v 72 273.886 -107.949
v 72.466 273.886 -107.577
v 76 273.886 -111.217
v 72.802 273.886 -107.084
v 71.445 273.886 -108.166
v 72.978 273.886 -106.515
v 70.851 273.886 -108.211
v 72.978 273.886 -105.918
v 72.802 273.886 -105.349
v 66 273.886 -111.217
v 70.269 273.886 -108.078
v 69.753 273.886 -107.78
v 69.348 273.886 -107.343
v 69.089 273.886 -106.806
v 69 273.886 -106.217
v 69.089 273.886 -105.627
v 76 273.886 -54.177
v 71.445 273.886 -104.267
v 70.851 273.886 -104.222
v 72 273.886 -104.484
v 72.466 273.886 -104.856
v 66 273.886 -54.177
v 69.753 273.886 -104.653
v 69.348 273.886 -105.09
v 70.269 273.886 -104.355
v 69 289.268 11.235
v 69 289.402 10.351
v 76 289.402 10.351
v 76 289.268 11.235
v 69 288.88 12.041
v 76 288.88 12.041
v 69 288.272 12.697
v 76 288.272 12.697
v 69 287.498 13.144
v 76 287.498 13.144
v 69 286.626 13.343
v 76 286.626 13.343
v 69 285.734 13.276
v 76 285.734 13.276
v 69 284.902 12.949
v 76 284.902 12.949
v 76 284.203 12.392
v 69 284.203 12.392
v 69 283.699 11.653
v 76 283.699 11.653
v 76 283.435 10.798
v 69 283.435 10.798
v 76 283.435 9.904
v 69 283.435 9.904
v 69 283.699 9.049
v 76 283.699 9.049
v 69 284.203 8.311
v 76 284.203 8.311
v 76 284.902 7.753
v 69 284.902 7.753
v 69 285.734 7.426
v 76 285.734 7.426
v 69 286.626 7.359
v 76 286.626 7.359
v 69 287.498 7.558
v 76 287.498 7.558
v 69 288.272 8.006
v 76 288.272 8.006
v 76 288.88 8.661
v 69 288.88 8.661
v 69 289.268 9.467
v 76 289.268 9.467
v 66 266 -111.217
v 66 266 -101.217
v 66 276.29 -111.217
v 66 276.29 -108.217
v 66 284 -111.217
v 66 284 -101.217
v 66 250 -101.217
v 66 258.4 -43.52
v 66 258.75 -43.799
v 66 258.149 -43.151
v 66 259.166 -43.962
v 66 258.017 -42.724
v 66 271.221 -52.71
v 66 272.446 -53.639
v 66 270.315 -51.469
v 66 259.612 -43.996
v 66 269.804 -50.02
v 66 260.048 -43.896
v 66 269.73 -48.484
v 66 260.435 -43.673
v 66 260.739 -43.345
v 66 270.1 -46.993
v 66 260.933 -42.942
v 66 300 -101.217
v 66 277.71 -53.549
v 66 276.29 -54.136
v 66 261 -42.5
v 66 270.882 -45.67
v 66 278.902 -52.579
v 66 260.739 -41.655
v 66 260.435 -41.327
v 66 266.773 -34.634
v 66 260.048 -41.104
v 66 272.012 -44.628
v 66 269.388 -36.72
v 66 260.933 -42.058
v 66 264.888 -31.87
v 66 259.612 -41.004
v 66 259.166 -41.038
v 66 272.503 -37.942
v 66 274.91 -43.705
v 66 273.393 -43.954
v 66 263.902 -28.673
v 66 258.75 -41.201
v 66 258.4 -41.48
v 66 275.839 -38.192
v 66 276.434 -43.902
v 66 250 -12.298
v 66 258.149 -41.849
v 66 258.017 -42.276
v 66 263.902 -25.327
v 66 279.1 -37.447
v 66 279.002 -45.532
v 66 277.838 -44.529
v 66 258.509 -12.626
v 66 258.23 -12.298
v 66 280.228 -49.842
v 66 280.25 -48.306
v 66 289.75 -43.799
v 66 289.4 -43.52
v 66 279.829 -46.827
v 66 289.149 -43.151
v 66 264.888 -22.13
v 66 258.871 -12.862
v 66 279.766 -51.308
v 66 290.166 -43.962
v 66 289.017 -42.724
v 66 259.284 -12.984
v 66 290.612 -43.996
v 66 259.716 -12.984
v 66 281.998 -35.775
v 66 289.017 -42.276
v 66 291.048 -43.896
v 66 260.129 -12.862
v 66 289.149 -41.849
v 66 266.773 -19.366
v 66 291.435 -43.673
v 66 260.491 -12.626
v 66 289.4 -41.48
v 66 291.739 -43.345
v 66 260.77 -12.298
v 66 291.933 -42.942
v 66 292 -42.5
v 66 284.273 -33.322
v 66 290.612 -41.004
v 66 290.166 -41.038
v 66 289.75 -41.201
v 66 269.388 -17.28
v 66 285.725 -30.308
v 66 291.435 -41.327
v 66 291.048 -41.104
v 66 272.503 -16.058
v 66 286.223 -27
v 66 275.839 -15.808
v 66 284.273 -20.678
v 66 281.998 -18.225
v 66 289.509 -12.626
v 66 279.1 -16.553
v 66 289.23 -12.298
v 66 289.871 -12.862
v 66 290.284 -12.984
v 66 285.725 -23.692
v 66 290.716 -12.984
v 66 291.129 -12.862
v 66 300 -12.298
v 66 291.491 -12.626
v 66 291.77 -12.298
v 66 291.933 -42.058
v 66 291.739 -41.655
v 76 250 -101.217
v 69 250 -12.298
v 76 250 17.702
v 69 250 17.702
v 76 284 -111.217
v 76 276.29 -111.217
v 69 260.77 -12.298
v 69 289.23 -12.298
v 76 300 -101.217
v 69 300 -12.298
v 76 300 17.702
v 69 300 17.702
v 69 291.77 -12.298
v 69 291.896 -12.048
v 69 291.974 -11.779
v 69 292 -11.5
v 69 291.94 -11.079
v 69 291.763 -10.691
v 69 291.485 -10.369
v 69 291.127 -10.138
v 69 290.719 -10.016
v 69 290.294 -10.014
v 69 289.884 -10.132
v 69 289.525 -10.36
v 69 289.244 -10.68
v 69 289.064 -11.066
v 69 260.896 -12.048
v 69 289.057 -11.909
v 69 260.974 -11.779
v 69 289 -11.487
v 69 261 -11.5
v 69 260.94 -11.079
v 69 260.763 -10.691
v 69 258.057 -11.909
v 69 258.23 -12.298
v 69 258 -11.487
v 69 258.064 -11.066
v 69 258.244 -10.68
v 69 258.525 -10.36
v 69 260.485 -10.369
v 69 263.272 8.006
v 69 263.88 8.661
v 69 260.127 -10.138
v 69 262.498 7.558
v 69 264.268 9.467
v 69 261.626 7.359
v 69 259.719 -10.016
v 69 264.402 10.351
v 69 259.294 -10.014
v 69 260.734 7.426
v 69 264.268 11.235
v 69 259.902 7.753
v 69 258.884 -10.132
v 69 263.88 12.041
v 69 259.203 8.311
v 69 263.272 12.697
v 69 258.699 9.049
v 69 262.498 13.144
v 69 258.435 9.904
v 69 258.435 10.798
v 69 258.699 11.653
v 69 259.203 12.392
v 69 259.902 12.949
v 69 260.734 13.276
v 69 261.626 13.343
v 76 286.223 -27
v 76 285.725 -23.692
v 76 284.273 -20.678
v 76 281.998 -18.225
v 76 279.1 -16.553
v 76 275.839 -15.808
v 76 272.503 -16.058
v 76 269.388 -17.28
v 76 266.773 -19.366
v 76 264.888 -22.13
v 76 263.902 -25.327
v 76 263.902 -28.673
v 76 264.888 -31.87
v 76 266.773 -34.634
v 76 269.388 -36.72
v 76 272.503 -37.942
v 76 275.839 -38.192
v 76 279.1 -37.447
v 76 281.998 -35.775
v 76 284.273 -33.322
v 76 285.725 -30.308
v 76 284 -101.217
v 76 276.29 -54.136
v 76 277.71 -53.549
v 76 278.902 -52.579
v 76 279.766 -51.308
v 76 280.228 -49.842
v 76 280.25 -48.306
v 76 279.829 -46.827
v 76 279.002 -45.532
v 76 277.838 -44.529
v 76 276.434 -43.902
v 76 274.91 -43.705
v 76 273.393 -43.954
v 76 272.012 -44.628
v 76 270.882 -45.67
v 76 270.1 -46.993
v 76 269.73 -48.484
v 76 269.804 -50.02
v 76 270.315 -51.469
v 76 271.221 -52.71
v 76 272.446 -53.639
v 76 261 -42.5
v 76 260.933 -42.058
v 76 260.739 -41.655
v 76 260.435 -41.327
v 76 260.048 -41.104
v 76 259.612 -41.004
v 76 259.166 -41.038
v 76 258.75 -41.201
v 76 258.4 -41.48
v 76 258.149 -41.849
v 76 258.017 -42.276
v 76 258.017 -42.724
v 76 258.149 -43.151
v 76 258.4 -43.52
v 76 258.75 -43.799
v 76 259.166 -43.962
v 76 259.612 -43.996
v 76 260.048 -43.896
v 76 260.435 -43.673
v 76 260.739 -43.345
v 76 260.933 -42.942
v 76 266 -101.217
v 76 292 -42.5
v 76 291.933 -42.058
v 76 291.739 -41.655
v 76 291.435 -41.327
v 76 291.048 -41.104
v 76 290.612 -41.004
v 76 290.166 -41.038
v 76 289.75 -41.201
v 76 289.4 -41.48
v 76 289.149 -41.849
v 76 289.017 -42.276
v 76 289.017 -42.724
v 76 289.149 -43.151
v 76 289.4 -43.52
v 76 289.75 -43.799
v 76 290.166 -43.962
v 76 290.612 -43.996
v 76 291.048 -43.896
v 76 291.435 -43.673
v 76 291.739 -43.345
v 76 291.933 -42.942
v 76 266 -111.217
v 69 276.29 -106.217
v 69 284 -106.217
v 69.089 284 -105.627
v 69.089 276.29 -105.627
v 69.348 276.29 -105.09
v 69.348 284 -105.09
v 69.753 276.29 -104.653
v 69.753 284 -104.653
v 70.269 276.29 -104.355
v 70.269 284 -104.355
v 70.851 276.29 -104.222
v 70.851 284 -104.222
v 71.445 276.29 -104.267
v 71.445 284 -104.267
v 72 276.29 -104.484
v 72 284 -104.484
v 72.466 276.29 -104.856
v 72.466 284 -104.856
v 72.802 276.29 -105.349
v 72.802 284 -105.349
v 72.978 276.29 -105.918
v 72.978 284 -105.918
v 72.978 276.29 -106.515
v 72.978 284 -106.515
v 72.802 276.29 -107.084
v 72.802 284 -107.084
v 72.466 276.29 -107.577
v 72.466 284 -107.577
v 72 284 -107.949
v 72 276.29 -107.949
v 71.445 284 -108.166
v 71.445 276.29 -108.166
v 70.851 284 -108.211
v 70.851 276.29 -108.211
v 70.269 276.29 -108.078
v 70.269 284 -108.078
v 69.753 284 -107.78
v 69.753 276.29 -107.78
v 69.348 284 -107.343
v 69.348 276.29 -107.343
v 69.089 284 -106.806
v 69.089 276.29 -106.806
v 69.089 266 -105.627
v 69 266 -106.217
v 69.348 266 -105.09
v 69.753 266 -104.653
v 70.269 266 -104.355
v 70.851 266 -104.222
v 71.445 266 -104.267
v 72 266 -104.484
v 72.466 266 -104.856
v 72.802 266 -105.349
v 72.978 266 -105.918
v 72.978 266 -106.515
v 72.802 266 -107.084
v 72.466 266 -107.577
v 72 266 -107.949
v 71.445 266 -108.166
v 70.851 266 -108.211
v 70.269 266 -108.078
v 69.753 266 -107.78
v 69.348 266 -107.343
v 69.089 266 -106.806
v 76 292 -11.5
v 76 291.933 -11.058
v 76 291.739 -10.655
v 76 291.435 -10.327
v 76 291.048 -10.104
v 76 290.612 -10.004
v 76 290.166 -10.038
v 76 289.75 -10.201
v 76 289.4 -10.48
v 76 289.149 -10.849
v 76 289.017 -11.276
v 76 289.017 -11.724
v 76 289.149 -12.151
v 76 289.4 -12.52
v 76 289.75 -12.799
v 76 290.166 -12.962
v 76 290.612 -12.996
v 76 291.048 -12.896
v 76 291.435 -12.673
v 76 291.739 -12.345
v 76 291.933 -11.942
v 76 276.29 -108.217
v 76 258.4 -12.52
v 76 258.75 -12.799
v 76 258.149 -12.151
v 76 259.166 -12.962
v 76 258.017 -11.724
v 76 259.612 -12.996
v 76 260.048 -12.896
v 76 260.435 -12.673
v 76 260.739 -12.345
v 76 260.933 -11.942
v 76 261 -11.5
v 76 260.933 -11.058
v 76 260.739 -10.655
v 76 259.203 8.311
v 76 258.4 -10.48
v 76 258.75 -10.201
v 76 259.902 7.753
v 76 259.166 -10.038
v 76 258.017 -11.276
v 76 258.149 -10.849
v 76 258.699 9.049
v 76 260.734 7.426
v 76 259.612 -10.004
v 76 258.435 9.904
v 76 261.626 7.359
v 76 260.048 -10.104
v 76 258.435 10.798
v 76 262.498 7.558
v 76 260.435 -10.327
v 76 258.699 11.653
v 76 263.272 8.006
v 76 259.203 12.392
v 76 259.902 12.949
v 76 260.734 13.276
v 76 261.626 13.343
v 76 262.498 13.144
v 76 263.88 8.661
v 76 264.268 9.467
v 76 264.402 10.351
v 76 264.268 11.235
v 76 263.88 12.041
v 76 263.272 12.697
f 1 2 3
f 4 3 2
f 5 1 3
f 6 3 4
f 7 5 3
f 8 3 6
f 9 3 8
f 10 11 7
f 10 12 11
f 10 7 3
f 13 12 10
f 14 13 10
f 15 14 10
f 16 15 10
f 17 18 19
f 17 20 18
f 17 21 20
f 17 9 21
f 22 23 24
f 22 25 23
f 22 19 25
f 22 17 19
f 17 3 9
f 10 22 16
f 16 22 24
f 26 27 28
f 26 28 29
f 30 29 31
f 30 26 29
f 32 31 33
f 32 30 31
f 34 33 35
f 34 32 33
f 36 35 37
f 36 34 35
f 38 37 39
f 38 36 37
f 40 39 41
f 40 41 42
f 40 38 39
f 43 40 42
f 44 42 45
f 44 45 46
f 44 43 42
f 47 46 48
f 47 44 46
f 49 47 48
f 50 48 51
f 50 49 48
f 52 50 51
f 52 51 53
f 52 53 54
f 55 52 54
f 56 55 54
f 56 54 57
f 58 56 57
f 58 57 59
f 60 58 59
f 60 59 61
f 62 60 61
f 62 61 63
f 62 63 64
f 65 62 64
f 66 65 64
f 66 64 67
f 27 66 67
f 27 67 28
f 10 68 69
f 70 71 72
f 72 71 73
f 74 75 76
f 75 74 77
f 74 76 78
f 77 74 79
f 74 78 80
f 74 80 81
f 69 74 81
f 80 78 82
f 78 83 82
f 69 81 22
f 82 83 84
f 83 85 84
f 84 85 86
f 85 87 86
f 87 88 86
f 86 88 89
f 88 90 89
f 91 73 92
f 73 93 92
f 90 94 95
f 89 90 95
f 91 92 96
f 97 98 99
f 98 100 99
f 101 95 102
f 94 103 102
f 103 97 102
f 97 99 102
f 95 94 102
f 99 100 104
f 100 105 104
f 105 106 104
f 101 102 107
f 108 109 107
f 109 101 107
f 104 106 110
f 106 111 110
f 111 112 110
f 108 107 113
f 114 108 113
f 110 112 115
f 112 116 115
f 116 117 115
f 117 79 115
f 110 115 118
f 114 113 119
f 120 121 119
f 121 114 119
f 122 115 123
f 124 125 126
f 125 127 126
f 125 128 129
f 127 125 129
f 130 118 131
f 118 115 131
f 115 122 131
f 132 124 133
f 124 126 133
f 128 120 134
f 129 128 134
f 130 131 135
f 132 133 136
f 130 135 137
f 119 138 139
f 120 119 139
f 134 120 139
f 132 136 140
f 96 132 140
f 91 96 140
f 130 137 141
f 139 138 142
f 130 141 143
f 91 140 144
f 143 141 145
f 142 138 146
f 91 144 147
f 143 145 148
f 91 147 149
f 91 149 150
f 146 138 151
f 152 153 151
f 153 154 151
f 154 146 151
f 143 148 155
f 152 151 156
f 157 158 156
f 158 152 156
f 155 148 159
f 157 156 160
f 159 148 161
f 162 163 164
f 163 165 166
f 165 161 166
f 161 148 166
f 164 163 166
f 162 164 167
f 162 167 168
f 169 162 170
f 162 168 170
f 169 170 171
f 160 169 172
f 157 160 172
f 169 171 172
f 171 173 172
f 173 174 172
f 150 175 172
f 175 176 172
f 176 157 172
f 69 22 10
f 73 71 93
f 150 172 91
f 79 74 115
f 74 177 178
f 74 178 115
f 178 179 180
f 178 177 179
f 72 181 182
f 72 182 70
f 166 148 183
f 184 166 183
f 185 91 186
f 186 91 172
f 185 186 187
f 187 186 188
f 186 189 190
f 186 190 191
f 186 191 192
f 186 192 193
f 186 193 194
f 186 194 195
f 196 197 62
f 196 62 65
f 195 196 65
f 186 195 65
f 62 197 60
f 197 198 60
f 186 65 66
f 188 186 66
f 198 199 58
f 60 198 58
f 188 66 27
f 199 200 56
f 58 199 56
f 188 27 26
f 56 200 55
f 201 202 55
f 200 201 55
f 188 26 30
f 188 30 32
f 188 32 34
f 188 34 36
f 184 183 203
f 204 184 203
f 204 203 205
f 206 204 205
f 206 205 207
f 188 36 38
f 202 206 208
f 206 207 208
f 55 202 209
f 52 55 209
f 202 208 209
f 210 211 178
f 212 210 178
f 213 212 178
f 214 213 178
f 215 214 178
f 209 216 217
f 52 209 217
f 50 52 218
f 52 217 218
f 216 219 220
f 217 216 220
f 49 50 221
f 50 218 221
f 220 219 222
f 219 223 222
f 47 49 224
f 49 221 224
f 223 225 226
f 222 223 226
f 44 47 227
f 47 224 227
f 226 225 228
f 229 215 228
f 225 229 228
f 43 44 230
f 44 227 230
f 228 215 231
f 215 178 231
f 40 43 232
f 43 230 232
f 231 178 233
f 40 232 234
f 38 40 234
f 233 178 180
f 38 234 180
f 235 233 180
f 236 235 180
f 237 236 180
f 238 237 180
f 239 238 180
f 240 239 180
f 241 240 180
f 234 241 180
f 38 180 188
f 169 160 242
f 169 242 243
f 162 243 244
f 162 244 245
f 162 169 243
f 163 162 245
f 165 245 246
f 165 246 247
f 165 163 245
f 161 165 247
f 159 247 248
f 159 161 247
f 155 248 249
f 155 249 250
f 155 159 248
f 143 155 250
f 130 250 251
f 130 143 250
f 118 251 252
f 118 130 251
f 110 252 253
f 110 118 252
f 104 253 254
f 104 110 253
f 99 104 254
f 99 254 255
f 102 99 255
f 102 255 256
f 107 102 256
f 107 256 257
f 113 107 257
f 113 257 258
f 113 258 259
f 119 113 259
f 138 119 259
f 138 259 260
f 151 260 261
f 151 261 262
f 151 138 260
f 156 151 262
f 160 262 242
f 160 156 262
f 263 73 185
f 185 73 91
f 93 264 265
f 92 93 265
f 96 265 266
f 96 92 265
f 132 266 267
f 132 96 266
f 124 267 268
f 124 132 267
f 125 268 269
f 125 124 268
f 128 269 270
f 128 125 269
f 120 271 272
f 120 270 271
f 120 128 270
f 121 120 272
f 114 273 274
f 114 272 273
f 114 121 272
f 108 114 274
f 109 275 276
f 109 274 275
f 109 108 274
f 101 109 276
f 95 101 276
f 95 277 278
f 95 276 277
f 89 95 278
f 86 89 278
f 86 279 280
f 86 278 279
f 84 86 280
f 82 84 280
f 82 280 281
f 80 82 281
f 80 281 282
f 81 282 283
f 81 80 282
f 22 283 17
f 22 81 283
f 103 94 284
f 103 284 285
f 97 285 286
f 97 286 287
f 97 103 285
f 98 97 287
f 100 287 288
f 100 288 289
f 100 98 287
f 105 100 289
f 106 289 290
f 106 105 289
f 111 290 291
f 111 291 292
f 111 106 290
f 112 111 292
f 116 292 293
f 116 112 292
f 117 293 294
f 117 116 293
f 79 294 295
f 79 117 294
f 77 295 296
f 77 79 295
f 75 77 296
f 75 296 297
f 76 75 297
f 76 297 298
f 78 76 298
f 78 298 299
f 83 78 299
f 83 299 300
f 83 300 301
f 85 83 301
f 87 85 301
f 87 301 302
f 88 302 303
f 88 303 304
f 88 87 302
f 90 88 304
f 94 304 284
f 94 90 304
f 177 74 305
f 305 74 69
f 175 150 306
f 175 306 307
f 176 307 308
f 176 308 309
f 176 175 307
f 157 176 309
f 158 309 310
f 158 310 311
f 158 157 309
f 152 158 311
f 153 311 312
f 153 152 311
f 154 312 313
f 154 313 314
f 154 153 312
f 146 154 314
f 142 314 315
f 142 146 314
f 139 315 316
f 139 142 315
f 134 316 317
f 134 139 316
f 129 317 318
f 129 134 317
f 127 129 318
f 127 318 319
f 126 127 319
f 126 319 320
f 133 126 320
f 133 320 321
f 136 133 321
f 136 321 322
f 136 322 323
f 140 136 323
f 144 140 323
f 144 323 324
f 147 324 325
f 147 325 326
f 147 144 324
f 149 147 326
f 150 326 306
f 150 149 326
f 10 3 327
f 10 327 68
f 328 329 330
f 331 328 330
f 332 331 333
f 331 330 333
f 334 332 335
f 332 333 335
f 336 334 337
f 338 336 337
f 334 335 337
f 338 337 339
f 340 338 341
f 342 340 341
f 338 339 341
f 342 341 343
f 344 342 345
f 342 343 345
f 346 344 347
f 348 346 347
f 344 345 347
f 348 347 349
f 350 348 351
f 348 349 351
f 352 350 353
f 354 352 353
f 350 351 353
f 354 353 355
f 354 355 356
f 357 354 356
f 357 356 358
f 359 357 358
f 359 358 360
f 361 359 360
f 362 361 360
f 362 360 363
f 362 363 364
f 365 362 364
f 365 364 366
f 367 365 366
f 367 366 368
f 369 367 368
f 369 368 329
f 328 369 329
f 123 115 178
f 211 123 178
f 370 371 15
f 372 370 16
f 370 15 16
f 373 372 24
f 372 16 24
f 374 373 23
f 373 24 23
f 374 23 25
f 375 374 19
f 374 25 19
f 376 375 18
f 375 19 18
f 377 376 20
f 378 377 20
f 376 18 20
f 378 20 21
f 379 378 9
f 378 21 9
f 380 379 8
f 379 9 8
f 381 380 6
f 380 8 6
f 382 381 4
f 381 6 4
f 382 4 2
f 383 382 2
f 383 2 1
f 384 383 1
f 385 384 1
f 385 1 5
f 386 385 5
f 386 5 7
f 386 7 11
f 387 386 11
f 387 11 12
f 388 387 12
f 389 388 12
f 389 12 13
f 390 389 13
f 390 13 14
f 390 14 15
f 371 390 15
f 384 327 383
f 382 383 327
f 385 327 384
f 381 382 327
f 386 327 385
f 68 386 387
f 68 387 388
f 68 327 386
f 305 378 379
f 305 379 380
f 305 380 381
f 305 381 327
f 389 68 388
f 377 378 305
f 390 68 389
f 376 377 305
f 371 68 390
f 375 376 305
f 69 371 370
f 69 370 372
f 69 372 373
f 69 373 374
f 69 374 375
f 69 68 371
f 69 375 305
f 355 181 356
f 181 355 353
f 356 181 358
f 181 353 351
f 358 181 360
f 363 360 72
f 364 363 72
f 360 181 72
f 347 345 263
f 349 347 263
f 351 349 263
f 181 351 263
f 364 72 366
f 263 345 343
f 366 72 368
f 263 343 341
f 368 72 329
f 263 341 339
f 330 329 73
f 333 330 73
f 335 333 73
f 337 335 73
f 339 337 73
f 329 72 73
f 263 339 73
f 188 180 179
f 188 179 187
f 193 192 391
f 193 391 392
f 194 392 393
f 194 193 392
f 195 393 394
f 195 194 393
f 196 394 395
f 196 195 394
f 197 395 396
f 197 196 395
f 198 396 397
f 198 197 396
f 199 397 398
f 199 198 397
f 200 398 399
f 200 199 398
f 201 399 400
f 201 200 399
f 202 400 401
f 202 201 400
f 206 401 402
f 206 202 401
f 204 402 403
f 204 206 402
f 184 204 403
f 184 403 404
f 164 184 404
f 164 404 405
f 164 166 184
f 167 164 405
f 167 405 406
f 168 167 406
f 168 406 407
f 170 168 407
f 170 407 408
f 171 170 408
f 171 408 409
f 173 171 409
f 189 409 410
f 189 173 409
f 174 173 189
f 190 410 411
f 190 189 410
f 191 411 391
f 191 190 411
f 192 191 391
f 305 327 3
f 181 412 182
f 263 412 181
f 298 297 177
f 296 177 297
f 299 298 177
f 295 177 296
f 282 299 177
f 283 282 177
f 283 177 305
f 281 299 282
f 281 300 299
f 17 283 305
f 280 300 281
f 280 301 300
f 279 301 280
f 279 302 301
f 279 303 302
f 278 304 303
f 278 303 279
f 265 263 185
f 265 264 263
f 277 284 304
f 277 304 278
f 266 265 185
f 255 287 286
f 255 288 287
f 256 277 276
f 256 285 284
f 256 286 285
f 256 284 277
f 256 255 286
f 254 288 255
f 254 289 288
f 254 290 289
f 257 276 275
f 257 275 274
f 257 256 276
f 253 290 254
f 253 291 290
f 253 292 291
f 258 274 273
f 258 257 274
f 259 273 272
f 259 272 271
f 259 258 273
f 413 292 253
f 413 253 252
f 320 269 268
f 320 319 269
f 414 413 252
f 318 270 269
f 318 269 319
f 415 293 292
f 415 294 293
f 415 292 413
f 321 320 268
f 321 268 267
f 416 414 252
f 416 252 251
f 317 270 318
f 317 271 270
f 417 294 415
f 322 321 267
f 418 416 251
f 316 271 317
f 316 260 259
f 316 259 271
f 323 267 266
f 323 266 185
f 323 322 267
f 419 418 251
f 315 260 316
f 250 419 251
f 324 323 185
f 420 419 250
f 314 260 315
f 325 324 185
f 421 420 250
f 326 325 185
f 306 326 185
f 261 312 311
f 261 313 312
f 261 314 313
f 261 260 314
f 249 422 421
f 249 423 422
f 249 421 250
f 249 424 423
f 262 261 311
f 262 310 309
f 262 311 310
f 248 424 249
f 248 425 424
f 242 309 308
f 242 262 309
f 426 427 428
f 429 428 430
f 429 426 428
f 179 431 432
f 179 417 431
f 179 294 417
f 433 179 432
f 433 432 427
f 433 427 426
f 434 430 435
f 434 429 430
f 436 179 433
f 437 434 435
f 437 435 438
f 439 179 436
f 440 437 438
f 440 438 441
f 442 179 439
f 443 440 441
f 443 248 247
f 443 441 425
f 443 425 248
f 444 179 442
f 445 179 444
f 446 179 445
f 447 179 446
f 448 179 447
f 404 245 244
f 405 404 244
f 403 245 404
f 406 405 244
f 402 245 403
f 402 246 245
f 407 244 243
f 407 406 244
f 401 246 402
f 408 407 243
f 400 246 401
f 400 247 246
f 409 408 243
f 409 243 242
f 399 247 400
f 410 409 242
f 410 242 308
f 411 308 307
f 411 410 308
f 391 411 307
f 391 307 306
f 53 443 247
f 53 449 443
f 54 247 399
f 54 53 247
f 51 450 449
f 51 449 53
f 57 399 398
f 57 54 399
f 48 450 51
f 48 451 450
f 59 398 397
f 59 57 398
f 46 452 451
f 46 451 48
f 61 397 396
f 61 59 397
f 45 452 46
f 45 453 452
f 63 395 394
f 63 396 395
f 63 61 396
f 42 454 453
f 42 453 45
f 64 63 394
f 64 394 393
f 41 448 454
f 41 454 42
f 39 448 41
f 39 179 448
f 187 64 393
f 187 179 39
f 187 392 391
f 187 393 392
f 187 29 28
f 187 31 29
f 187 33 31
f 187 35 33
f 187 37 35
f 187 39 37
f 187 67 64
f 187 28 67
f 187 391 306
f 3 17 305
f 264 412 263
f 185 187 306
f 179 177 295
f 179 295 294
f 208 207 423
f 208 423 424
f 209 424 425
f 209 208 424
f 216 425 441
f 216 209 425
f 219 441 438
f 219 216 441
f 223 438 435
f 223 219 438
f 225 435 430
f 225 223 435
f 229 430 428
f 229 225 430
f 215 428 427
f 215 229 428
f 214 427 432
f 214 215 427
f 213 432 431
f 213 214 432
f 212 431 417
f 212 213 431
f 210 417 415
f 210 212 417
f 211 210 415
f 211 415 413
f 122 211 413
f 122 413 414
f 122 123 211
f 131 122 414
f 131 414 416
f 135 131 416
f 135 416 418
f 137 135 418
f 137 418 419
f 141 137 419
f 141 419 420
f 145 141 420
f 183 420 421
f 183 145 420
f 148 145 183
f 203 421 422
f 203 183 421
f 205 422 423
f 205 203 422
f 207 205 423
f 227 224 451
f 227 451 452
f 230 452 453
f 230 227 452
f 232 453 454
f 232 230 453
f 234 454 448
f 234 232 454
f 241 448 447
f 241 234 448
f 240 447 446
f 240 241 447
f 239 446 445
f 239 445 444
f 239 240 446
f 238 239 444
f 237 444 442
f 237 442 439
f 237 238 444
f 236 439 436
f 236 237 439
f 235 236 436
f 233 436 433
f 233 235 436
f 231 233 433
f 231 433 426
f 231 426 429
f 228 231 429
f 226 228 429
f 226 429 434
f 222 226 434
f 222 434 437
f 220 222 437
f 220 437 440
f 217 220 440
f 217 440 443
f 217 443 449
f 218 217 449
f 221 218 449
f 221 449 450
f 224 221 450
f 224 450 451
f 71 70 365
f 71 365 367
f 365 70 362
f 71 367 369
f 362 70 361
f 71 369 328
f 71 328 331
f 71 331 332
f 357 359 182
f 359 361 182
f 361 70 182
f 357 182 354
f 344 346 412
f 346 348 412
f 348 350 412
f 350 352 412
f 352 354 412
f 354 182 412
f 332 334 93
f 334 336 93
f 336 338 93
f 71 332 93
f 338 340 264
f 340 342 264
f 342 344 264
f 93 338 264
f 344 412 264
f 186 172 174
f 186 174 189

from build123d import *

# Parameters (mm, degrees)
SKETCH_1_R          = 1.5
SKETCH_1_R_2        = 5.295460532
SKETCH_1_R_3        = 3
SKETCH_1_R_4        = 11.223257521
EXTRUDE_1_DEPTH     = 10
SKETCH_3_W          = 3
SKETCH_3_H          = 30
CUT_EXTRUDE_2_DEPTH = 50
CUT_EXTRUDE_3_DEPTH = 10
SKETCH_5_W          = 10
SKETCH_5_H          = 23.885605854
SKETCH_5_H_2        = 23.710254383
EXTRUDE_2_DEPTH     = 3
SKETCH_6_R          = 3.5
CUT_EXTRUDE_4_DEPTH = 5
SKETCH_7_R          = 2
CUT_EXTRUDE_5_DEPTH = 45
SKETCH_8_W          = 10
SKETCH_8_H          = 16
CUT_EXTRUDE_6_DEPTH = 10


with BuildPart() as part:
    # 草图1 → 凸台-拉伸1 (new body)
    with BuildSketch(Plane(origin=(66, 0, 0), x_dir=(0, 0, -1), z_dir=(1, 0, 0))):
        Polygon((48, 250), (-3, 250), (-17.702150009, 250), (-17.702150009, 300), (-3, 300), (48, 300), (108.216548797, 300), (108.216548797, 250), align=None)
        with Locations(Location((42.5, 259.5, 0), (0, 0, 90))):
            Circle(SKETCH_1_R, mode=Mode.SUBTRACT)
        with Locations(Location((42.5, 290.5, 0), (0, 0, 90))):
            Circle(SKETCH_1_R, mode=Mode.SUBTRACT)
        with Locations(Location((11.5, 259.5, 0), (0, 0, 90))):
            Circle(SKETCH_1_R, mode=Mode.SUBTRACT)
        with Locations(Location((11.5, 290.5, 0), (0, 0, 90))):
            Circle(SKETCH_1_R, mode=Mode.SUBTRACT)
        with Locations(Location((49, 275, 0), (0, 0, 90))):
            Circle(SKETCH_1_R_2, mode=Mode.SUBTRACT)
        with Locations(Location((-10.351075004, 286.4017148, 0), (0, 0, 90))):
            Circle(SKETCH_1_R_3, mode=Mode.SUBTRACT)
        with Locations(Location((-10.351075004, 261.4017148, 0), (0, 0, 90))):
            Circle(SKETCH_1_R_3, mode=Mode.SUBTRACT)
        with Locations(Location((27, 275, 0), (0, 0, 90))):
            Circle(SKETCH_1_R_4, mode=Mode.SUBTRACT)
    extrude(amount=EXTRUDE_1_DEPTH)

    # 草图3 → 切除-拉伸2 (cut)
    with BuildSketch(Plane.XZ.offset(-250)):
        with Locations((67.5, 2.702150009)):
            Rectangle(SKETCH_3_W, SKETCH_3_H)
    extrude(amount=-CUT_EXTRUDE_2_DEPTH, mode=Mode.SUBTRACT)

    # 草图4 → 切除-拉伸3 (cut)
    with BuildSketch(Plane(origin=(76, 0, 0), x_dir=(0, 0, -1), z_dir=(1, 0, 0))):
        Polygon((108.216548797, 276.289745617), (49.527425716, 276.289745617), (49.527425716, 273.885605854), (109.527425716, 273.885605854), (109.527425716, 276.289745617), align=None)
    extrude(amount=-CUT_EXTRUDE_3_DEPTH, mode=Mode.SUBTRACT)

    # 草图5 → 凸台-拉伸2 (add)
    with BuildSketch(Plane(origin=(0, 0, -108.216548797), x_dir=(-1, 0, 0), z_dir=(0, 0, -1))):
        with Locations((-71, 261.942802927)):
            Rectangle(SKETCH_5_W, SKETCH_5_H)
        with Locations((-71, 288.144872808)):
            Rectangle(SKETCH_5_W, SKETCH_5_H_2)
    extrude(amount=EXTRUDE_2_DEPTH)

    # 草图6 → 切除-拉伸4 (cut)
    with BuildSketch(Plane(origin=(0, 300, 0), x_dir=(1, 0, 0), z_dir=(0, 1, 0))):
        with Locations(Location((71, 106.216548797, 0), (0, 0, 180))):
            Circle(SKETCH_6_R)
    extrude(amount=-CUT_EXTRUDE_4_DEPTH, mode=Mode.SUBTRACT)

    # 草图7 → 切除-拉伸5 (cut)
    with BuildSketch(Plane(origin=(0, 295, 0), x_dir=(1, 0, 0), z_dir=(0, 1, 0))):
        with Locations(Location((71, 106.216548797, 0), (0, 0, 180))):
            Circle(SKETCH_7_R)
    extrude(amount=-CUT_EXTRUDE_5_DEPTH, mode=Mode.SUBTRACT)

    # 草图8 → 切除-拉伸6 (cut)
    with BuildSketch(Plane.ZY.offset(-66)):
        with Locations((-106.216548797, 292)):
            Rectangle(SKETCH_8_W, SKETCH_8_H)
        with Locations((-106.216548797, 258)):
            Rectangle(SKETCH_8_W, SKETCH_8_H)
    extrude(amount=-CUT_EXTRUDE_6_DEPTH, mode=Mode.SUBTRACT)


solid = part.part
